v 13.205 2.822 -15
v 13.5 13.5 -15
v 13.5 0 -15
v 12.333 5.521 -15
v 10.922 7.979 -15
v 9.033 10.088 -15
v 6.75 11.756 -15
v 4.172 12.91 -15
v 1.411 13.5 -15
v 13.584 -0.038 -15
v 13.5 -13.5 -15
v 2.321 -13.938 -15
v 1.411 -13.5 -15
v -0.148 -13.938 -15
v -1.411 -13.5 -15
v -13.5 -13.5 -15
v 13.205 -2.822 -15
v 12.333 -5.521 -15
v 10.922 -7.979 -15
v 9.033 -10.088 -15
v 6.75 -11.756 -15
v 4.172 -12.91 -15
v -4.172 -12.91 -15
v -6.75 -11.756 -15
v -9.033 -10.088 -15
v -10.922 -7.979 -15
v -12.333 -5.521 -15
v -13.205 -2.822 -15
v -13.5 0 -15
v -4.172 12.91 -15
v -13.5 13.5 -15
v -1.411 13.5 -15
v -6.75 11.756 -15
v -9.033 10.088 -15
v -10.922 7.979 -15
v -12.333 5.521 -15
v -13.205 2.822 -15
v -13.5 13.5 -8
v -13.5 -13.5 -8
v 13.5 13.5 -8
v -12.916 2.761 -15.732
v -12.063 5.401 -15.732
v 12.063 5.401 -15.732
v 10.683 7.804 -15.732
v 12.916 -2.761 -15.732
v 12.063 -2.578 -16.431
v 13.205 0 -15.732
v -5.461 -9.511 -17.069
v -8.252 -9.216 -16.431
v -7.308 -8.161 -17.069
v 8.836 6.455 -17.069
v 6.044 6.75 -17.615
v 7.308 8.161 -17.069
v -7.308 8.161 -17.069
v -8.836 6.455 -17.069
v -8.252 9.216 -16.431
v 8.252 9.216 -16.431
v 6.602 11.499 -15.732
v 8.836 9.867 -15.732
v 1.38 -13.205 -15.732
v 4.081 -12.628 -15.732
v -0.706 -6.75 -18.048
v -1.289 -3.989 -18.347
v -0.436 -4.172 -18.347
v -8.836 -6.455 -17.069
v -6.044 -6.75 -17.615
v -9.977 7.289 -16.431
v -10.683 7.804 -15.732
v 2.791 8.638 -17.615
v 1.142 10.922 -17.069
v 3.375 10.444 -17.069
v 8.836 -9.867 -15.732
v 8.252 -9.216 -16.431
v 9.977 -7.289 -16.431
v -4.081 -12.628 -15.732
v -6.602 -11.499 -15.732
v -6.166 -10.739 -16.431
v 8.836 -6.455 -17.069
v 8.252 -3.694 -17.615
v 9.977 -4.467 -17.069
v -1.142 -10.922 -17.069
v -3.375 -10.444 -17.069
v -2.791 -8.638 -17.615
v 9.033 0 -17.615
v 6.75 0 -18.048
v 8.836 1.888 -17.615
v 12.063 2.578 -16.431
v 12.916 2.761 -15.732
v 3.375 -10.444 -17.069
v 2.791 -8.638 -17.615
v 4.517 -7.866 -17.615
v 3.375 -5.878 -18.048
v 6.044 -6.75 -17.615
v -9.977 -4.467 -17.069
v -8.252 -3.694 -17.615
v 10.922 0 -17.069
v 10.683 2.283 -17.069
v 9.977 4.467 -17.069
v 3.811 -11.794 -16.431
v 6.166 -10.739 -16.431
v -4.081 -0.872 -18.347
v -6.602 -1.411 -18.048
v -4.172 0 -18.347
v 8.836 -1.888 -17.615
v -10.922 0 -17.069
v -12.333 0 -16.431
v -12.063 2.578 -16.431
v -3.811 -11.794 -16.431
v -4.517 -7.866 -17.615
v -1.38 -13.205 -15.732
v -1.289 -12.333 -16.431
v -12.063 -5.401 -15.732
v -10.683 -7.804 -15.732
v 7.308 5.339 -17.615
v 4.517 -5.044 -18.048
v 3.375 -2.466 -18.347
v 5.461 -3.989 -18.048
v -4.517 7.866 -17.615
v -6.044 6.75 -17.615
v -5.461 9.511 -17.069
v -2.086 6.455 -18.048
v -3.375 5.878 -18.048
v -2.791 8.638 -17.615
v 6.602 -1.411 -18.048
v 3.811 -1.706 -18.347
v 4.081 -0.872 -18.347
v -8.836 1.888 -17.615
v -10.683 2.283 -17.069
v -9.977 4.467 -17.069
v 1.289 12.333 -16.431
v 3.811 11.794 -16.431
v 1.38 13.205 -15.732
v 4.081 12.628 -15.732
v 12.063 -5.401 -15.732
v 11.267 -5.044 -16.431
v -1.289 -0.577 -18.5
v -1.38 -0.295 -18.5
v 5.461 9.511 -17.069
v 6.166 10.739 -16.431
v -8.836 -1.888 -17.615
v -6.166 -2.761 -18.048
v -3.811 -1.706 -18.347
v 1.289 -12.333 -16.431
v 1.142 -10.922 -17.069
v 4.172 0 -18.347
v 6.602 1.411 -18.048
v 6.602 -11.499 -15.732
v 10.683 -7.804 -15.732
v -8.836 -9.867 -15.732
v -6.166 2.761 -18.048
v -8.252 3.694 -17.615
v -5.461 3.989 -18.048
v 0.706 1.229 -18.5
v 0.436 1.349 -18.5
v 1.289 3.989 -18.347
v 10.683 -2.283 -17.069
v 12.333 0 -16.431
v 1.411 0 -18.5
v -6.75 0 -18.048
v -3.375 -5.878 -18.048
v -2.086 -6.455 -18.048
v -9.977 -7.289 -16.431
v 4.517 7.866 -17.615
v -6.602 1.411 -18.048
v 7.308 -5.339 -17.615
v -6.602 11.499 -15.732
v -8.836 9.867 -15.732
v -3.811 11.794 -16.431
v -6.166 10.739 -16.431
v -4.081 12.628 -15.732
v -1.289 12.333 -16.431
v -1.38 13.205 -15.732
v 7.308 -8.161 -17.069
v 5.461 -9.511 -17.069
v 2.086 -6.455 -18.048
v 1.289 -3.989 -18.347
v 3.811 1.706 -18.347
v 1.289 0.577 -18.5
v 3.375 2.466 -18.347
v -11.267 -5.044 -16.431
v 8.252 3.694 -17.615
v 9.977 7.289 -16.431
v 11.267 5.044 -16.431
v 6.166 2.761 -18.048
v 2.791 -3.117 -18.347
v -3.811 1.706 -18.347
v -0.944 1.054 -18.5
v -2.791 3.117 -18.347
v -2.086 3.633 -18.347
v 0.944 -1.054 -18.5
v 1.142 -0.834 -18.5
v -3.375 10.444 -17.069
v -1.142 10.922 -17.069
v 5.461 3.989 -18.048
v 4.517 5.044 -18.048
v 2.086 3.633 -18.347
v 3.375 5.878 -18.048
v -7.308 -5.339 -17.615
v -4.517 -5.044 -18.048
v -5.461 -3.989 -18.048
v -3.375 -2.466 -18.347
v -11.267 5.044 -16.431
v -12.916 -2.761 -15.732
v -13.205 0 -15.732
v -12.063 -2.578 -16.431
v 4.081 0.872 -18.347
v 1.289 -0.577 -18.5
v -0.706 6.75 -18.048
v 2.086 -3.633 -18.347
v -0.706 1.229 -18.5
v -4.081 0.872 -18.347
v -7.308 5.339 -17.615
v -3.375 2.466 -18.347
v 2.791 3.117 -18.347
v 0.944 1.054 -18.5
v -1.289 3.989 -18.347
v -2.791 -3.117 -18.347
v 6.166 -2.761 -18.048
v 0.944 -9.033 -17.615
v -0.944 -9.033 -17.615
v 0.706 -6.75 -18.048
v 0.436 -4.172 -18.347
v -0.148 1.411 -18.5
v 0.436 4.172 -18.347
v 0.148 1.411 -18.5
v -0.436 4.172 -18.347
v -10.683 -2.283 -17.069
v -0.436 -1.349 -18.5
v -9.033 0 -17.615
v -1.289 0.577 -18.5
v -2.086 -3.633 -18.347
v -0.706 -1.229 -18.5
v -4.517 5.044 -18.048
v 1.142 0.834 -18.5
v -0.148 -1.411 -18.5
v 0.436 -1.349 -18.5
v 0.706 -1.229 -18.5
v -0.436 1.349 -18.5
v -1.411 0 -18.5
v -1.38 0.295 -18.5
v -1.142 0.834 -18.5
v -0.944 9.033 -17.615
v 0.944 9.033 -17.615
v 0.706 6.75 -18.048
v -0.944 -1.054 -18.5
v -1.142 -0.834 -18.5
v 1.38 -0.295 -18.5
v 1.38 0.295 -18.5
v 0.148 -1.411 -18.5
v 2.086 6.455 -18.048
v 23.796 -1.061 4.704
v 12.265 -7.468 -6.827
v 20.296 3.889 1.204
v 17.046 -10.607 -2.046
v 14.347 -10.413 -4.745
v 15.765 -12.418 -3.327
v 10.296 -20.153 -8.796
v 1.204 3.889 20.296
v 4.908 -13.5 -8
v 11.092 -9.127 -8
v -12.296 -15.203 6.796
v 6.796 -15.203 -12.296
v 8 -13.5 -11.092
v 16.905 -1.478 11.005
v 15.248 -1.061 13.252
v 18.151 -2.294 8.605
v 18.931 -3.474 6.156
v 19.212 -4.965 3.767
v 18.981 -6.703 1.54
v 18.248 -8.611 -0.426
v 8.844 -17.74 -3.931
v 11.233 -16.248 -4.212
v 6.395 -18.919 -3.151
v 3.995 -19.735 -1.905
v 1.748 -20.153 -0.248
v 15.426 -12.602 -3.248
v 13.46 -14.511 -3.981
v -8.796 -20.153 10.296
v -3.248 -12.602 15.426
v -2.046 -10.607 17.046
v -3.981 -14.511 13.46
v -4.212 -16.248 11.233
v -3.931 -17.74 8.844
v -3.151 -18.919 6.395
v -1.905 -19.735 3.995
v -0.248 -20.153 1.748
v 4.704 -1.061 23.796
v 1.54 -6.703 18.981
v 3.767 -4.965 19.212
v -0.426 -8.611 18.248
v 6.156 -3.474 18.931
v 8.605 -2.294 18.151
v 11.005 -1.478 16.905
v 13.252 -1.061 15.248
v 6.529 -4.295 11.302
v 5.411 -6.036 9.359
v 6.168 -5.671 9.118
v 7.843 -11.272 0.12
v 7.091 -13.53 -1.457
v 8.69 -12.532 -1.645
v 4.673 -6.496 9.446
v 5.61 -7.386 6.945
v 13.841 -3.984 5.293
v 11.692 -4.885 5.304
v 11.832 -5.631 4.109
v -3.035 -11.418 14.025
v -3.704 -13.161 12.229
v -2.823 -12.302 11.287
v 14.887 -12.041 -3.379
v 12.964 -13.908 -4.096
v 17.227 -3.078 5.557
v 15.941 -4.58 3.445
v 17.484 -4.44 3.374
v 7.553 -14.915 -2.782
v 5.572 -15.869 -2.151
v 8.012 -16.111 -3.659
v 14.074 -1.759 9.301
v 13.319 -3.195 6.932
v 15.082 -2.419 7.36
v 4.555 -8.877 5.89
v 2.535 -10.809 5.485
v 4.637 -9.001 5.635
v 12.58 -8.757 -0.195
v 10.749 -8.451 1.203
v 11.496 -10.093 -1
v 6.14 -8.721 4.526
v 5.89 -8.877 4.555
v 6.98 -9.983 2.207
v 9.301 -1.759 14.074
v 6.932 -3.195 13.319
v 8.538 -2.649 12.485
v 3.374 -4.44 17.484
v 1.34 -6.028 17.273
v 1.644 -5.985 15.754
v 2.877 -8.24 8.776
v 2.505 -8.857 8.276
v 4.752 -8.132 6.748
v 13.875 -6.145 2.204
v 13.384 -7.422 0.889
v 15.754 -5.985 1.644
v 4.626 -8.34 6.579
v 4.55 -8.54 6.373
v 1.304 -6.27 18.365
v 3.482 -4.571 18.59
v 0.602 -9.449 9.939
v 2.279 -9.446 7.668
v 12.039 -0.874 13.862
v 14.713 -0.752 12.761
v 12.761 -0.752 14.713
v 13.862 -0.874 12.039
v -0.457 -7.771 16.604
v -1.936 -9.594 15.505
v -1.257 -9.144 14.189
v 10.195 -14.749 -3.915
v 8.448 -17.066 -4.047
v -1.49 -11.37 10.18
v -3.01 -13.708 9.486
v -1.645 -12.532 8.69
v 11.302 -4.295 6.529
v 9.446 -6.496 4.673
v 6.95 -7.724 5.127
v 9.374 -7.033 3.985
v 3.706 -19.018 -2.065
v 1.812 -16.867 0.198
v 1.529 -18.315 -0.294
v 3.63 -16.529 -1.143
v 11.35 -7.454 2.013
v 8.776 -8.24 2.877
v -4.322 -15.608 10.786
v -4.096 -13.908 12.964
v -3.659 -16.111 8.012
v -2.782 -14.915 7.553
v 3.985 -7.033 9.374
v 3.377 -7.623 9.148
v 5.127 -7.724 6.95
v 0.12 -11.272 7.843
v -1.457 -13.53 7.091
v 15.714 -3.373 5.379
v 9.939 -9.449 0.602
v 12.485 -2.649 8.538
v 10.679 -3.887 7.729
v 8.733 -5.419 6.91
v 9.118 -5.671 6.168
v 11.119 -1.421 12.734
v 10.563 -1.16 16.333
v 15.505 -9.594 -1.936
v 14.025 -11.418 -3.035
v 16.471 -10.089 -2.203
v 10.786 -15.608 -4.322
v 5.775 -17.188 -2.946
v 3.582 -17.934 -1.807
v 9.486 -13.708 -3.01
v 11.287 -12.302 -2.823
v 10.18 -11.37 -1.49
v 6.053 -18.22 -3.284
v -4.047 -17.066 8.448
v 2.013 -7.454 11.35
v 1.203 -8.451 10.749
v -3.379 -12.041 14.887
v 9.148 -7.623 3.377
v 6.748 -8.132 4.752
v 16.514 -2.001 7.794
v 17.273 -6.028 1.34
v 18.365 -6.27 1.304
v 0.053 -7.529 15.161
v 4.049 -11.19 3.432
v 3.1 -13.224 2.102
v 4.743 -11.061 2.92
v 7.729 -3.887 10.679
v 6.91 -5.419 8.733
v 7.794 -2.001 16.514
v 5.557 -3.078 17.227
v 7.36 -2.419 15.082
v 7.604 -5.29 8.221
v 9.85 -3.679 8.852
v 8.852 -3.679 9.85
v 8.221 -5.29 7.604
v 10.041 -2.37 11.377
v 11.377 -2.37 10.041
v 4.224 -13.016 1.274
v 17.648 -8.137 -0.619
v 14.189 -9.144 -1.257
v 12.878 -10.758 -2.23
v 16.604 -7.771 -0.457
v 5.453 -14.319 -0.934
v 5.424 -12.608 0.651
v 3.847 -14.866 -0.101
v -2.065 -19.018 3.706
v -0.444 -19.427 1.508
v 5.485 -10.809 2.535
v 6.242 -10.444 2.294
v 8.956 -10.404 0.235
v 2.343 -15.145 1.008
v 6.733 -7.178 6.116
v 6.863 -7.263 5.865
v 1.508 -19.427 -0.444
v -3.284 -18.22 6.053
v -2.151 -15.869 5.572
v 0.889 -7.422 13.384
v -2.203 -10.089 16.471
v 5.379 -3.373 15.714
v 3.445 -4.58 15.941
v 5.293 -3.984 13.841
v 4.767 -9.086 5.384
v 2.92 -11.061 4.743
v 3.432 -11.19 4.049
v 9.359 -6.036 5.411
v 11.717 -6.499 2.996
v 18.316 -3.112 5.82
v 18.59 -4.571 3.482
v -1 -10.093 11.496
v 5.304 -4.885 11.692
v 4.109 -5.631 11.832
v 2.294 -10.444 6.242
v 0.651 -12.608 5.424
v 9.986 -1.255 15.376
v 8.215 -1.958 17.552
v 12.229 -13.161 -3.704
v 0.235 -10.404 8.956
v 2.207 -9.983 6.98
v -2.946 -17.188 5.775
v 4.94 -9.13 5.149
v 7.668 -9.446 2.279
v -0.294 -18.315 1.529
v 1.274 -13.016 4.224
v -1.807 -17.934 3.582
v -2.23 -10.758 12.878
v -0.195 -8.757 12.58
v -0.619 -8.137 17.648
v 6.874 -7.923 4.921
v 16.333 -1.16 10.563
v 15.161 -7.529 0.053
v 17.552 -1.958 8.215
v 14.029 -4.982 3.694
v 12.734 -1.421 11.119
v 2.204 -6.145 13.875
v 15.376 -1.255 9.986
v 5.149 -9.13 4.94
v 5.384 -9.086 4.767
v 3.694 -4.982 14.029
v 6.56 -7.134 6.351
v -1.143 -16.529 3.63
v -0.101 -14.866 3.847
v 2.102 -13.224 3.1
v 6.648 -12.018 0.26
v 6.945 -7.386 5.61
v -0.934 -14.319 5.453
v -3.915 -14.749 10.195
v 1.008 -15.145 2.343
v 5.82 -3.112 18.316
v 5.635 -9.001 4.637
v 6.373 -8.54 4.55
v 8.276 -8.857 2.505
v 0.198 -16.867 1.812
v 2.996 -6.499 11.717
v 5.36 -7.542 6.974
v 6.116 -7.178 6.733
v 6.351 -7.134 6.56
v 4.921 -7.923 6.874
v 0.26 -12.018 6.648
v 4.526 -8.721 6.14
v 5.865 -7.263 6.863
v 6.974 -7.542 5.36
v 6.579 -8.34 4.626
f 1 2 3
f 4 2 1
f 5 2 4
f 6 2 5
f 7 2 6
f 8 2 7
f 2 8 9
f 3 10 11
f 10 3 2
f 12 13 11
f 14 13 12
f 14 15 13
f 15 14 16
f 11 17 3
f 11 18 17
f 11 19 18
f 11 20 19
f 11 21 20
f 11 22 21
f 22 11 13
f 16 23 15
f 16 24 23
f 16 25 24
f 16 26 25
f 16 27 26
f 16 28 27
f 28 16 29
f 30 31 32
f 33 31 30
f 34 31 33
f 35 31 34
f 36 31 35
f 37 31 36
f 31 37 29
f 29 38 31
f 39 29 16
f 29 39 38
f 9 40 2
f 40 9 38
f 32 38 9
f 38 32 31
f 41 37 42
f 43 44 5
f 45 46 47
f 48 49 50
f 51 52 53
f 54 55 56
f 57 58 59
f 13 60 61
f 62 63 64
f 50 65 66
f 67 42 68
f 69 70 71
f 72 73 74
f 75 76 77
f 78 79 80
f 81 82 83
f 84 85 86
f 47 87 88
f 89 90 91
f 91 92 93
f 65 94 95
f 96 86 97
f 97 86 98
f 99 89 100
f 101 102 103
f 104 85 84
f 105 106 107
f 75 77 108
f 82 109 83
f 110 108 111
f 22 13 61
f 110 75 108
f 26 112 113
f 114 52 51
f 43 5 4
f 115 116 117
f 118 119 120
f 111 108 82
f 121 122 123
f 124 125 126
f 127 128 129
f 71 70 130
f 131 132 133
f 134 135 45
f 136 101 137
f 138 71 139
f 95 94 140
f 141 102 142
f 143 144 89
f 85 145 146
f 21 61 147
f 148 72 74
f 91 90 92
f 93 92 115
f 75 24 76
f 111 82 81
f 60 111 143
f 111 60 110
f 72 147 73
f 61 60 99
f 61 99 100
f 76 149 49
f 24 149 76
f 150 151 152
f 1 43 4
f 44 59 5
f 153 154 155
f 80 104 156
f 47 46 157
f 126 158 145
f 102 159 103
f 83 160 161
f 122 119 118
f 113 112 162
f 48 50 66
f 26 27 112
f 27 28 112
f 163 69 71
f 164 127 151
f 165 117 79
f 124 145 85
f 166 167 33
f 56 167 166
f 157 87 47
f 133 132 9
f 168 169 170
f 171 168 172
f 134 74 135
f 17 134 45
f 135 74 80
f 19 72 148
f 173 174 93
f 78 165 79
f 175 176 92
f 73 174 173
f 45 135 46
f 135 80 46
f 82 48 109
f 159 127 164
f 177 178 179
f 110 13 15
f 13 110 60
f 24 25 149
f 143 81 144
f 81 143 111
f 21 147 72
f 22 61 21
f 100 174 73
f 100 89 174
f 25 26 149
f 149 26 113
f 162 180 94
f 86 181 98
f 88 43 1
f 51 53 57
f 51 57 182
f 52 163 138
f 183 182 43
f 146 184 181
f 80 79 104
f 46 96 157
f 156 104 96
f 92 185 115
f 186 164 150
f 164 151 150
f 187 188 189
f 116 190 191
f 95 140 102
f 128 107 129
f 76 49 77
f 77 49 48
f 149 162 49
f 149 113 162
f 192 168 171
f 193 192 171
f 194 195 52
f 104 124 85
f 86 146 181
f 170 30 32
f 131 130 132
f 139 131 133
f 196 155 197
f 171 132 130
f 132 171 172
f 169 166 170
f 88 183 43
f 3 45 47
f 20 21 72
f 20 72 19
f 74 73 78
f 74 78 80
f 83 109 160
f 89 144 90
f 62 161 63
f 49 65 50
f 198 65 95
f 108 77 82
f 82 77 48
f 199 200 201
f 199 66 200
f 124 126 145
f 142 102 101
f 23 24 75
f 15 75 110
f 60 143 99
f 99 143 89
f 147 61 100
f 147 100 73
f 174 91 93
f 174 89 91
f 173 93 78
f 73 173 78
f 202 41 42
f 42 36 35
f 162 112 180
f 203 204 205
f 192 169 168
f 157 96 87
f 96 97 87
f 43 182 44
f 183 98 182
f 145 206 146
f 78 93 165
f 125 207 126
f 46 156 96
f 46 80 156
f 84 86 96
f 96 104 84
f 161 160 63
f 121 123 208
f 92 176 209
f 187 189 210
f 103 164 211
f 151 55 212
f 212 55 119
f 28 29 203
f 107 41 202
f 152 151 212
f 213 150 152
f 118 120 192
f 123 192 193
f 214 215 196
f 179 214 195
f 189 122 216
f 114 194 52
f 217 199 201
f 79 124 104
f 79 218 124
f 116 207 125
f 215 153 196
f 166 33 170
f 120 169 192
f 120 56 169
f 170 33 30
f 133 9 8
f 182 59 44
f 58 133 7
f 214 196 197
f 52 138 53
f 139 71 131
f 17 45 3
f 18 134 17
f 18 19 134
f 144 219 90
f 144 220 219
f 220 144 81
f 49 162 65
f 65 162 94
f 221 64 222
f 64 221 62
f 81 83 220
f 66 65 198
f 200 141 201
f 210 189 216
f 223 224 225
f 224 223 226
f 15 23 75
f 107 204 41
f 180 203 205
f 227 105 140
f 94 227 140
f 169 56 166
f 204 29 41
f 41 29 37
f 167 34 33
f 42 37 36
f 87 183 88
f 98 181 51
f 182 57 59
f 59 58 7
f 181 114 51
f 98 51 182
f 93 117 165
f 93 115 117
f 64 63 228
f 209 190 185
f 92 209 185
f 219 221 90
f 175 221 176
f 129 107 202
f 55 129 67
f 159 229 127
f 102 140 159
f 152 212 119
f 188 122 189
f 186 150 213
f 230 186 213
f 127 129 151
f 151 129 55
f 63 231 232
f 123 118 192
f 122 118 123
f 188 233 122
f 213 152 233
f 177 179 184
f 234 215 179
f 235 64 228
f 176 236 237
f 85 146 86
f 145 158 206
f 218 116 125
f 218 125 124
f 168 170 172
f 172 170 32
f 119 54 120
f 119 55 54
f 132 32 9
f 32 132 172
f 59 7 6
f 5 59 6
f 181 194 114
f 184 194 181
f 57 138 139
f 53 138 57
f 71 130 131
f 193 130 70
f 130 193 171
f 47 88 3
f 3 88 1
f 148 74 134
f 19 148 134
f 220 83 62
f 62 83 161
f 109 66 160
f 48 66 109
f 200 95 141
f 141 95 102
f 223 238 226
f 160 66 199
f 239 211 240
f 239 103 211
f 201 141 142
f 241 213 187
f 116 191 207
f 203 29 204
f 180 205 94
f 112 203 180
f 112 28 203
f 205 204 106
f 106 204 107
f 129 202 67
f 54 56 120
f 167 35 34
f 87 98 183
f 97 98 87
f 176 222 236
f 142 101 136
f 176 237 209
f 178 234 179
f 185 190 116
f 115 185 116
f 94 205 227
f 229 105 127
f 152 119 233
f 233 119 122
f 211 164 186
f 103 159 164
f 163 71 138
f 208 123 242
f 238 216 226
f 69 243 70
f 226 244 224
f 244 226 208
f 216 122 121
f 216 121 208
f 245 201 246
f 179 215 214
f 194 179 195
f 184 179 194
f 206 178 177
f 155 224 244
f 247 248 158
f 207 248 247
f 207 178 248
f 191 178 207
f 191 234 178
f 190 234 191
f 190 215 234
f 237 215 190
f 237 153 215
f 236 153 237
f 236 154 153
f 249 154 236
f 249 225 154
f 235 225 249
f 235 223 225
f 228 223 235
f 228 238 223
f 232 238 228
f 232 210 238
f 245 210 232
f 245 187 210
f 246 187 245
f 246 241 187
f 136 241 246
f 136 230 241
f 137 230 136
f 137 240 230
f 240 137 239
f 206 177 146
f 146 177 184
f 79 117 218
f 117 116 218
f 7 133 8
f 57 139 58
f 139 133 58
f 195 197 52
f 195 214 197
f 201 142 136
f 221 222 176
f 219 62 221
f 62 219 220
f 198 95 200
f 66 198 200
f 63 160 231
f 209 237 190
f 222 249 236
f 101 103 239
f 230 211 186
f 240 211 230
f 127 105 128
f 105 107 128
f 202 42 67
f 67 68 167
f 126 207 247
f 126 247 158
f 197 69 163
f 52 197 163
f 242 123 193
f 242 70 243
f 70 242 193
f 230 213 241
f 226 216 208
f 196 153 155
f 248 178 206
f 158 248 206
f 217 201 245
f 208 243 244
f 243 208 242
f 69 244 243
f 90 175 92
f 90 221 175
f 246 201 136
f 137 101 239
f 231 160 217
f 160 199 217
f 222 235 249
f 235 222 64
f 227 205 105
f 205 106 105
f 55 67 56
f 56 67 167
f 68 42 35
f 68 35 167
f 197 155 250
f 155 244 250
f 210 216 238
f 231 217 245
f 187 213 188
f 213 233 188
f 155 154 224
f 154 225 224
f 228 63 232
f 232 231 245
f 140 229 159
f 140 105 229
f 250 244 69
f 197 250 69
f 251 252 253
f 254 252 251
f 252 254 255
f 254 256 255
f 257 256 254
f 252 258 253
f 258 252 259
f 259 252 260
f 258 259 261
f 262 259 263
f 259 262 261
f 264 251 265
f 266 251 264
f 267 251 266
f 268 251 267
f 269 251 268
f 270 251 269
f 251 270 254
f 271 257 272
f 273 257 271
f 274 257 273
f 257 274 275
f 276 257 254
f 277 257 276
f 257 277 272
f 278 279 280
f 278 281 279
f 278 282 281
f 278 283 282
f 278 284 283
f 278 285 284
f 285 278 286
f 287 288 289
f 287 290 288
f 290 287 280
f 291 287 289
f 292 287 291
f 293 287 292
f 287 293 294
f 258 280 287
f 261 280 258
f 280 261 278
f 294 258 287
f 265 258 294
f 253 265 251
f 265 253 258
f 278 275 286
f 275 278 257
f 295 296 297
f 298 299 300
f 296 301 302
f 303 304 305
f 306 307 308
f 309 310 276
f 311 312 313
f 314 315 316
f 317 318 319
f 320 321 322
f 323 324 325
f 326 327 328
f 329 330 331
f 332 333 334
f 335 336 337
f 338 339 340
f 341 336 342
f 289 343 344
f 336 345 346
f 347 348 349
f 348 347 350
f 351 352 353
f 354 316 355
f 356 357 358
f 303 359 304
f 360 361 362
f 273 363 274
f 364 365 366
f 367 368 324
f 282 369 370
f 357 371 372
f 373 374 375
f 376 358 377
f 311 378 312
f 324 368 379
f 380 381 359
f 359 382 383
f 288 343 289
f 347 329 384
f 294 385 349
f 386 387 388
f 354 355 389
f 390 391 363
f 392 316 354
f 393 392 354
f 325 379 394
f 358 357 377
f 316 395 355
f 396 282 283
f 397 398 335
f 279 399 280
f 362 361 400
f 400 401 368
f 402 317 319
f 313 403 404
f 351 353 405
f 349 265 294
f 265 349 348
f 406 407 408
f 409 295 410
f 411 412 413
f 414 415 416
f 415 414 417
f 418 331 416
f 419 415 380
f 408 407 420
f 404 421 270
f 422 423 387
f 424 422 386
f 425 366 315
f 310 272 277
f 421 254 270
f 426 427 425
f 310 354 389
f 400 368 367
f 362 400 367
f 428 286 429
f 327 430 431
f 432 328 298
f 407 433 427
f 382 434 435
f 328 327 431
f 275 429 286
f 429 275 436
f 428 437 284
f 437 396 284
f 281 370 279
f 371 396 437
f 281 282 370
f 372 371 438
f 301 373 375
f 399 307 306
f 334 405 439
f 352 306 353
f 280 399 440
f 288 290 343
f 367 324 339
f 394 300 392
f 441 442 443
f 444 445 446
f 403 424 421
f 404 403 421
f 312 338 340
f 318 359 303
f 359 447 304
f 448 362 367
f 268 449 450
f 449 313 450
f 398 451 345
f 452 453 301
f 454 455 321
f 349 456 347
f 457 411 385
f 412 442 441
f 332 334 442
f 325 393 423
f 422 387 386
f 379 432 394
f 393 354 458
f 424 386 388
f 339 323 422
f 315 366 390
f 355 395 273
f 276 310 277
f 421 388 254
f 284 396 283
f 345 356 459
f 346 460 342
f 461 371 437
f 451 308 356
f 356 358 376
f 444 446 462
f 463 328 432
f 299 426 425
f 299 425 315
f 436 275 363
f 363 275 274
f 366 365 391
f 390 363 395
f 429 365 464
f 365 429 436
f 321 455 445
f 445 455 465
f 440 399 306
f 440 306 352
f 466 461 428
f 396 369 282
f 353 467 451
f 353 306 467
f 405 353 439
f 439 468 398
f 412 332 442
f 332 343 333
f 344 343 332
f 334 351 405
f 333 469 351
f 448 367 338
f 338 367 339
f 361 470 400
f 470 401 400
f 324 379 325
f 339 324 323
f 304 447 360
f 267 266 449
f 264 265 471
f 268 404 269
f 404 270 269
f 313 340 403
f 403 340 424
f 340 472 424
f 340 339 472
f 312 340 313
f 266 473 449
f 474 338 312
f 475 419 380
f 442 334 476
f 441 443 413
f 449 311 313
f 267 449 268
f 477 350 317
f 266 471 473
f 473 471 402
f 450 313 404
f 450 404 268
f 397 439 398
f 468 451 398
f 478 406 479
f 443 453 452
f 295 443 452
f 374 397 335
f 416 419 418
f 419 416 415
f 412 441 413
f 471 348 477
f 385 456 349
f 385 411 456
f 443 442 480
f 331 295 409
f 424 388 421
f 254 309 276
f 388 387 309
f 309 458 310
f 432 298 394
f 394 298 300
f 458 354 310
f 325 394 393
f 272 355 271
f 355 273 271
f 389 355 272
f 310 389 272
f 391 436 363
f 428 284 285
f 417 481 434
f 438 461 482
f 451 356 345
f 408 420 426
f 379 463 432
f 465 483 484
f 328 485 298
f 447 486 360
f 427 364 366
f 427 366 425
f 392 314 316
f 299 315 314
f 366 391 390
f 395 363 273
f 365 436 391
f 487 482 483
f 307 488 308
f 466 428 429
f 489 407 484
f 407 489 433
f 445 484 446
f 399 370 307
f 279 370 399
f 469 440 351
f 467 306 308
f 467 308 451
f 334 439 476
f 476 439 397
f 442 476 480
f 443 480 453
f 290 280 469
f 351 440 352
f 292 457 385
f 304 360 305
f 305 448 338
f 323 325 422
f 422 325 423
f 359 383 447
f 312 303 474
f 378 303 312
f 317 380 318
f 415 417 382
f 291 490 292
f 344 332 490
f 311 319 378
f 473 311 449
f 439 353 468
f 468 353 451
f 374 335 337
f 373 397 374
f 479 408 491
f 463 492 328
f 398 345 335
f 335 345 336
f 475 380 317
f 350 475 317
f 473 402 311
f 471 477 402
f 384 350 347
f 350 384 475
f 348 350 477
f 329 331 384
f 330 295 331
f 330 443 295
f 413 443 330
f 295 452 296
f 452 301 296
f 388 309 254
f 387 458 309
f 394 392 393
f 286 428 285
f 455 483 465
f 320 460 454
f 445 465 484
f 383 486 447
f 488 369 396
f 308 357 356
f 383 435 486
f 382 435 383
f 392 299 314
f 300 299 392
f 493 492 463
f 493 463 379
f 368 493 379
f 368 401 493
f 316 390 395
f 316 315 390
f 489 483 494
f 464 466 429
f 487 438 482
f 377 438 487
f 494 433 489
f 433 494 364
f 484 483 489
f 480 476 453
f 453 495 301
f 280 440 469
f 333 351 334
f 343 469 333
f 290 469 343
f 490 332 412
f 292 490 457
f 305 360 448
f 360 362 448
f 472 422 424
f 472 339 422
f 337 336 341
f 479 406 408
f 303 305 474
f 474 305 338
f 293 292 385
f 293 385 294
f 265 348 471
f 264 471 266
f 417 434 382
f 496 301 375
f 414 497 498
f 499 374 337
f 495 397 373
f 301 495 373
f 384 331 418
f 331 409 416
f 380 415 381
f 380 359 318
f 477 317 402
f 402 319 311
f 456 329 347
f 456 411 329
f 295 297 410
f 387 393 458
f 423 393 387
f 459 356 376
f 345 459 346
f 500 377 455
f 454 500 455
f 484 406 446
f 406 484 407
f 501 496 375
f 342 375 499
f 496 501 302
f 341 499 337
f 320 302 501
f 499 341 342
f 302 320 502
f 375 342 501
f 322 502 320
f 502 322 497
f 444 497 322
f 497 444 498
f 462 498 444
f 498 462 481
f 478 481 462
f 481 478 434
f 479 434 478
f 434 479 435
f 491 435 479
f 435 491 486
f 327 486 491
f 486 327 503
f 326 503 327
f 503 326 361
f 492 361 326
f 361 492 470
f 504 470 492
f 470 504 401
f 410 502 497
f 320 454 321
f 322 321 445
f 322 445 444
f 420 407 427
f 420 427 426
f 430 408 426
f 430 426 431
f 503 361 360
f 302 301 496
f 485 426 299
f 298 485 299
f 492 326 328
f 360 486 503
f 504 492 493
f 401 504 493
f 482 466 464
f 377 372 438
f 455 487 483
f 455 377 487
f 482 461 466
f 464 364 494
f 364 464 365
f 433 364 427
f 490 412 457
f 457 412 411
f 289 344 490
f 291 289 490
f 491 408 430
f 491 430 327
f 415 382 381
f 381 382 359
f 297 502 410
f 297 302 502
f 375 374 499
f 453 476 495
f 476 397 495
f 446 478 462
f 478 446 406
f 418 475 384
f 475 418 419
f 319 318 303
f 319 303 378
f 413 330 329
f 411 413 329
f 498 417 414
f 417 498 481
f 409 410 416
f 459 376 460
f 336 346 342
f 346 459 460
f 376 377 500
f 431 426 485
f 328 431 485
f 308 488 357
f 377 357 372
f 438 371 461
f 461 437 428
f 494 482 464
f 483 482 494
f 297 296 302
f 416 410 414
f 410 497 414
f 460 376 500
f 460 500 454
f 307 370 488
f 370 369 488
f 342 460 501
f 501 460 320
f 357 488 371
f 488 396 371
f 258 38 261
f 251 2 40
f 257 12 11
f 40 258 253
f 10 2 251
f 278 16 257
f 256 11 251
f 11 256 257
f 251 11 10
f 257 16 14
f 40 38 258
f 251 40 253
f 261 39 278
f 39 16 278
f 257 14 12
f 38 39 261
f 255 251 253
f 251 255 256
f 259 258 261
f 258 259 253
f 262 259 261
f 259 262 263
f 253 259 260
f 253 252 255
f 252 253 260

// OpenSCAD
joiner_diameter = 27;
cylinder_height=10;
depression=7;
lid_thickness=1;

standard=30;

module male_plate() {
    color("white")
    union() {
      translate([-joiner_diameter/2,-joiner_diameter/2]) cube([joiner_diameter,joiner_diameter,depression]);
      resize([joiner_diameter,joiner_diameter,depression])sphere(r=joiner_diameter/2);     
    }
};

module male_mask() {
    color("white")
    translate([-150,-150,-250]) cube([250,250,250]);
};



module female_plate() {
    color("white")
    difference() {
      translate([-joiner_diameter/2,-joiner_diameter/2]) cube([joiner_diameter,joiner_diameter,depression]);
      resize([joiner_diameter,joiner_diameter,depression])sphere(r=joiner_diameter/2);     
    }
};






module female_plate_lid() {
    color("white")
      translate([0,0,lid_thickness*0.5])
    difference() {
        translate([0,0,lid_thickness*0.5])
       resize([joiner_diameter,joiner_diameter,depression])sphere(r=joiner_diameter/2);   
        
      resize([joiner_diameter,joiner_diameter,depression])sphere(r=joiner_diameter/2);     
    }
    
        difference() {
        translate([0,0,lid_thickness*0.5])
       resize([joiner_diameter,joiner_diameter,depression])sphere(r=joiner_diameter/2);   
        
      resize([joiner_diameter,joiner_diameter,depression])sphere(r=joiner_diameter/2);   
        translate([-11,-10,0])  linear_extrude(100) text("C", size=20) ; 
    }
    
};


module male_plate_in_connector_context()
{
    translate([0,0,-standard/2])male_plate();
    };
    module male_mask_in_connector_context()
{
    translate([0,0,-standard/2])male_mask();
    };
    
    module female_plate_in_connector_context(angle)
{
    rotate(angle) translate([0,0,standard/2]) mirror([0,0,1])female_plate();
    };

module connecting_hull(){
    difference(){
        hull(){ children(0);
        children(1);};
        hull() children(2);
        hull() children(1);
}};



module connector(angle){
    
        male_plate_in_connector_context();
        female_plate_in_connector_context(angle);
        connecting_hull(){ male_plate_in_connector_context();
            female_plate_in_connector_context(angle);
            male_mask_in_connector_context();
            }
          //translate([0,0,standard/2])
          
    };
    
    
module piece_creator(angle,col="white"){
    color(col) connector(angle);
    
    rotate(angle) translate([0,0,standard]) children();
    
}

        
module straight(){
    piece_creator([0,0,0], "white") children();
}

module left(){
    
    piece_creator([0,90,0]) children();
}

module left45(){
    
    piece_creator([0,45,0]) children();
}

module right(){
    
    piece_creator([0,-90,0]) children();
}

module right45(){
    
    piece_creator([0,-45,0]) children();
}
module up45(){
   
    piece_creator([45,0,0]) children();
}
module down45(){

    piece_creator([-45,0,0]) children();
}
module up(){
   
    piece_creator([90,0,0]) children();
}
module down(){

    piece_creator([-90,0,0]) children();
}

module upleft45(){
   
    piece_creator([45,45,0]) children();
}

upleft45() ;
